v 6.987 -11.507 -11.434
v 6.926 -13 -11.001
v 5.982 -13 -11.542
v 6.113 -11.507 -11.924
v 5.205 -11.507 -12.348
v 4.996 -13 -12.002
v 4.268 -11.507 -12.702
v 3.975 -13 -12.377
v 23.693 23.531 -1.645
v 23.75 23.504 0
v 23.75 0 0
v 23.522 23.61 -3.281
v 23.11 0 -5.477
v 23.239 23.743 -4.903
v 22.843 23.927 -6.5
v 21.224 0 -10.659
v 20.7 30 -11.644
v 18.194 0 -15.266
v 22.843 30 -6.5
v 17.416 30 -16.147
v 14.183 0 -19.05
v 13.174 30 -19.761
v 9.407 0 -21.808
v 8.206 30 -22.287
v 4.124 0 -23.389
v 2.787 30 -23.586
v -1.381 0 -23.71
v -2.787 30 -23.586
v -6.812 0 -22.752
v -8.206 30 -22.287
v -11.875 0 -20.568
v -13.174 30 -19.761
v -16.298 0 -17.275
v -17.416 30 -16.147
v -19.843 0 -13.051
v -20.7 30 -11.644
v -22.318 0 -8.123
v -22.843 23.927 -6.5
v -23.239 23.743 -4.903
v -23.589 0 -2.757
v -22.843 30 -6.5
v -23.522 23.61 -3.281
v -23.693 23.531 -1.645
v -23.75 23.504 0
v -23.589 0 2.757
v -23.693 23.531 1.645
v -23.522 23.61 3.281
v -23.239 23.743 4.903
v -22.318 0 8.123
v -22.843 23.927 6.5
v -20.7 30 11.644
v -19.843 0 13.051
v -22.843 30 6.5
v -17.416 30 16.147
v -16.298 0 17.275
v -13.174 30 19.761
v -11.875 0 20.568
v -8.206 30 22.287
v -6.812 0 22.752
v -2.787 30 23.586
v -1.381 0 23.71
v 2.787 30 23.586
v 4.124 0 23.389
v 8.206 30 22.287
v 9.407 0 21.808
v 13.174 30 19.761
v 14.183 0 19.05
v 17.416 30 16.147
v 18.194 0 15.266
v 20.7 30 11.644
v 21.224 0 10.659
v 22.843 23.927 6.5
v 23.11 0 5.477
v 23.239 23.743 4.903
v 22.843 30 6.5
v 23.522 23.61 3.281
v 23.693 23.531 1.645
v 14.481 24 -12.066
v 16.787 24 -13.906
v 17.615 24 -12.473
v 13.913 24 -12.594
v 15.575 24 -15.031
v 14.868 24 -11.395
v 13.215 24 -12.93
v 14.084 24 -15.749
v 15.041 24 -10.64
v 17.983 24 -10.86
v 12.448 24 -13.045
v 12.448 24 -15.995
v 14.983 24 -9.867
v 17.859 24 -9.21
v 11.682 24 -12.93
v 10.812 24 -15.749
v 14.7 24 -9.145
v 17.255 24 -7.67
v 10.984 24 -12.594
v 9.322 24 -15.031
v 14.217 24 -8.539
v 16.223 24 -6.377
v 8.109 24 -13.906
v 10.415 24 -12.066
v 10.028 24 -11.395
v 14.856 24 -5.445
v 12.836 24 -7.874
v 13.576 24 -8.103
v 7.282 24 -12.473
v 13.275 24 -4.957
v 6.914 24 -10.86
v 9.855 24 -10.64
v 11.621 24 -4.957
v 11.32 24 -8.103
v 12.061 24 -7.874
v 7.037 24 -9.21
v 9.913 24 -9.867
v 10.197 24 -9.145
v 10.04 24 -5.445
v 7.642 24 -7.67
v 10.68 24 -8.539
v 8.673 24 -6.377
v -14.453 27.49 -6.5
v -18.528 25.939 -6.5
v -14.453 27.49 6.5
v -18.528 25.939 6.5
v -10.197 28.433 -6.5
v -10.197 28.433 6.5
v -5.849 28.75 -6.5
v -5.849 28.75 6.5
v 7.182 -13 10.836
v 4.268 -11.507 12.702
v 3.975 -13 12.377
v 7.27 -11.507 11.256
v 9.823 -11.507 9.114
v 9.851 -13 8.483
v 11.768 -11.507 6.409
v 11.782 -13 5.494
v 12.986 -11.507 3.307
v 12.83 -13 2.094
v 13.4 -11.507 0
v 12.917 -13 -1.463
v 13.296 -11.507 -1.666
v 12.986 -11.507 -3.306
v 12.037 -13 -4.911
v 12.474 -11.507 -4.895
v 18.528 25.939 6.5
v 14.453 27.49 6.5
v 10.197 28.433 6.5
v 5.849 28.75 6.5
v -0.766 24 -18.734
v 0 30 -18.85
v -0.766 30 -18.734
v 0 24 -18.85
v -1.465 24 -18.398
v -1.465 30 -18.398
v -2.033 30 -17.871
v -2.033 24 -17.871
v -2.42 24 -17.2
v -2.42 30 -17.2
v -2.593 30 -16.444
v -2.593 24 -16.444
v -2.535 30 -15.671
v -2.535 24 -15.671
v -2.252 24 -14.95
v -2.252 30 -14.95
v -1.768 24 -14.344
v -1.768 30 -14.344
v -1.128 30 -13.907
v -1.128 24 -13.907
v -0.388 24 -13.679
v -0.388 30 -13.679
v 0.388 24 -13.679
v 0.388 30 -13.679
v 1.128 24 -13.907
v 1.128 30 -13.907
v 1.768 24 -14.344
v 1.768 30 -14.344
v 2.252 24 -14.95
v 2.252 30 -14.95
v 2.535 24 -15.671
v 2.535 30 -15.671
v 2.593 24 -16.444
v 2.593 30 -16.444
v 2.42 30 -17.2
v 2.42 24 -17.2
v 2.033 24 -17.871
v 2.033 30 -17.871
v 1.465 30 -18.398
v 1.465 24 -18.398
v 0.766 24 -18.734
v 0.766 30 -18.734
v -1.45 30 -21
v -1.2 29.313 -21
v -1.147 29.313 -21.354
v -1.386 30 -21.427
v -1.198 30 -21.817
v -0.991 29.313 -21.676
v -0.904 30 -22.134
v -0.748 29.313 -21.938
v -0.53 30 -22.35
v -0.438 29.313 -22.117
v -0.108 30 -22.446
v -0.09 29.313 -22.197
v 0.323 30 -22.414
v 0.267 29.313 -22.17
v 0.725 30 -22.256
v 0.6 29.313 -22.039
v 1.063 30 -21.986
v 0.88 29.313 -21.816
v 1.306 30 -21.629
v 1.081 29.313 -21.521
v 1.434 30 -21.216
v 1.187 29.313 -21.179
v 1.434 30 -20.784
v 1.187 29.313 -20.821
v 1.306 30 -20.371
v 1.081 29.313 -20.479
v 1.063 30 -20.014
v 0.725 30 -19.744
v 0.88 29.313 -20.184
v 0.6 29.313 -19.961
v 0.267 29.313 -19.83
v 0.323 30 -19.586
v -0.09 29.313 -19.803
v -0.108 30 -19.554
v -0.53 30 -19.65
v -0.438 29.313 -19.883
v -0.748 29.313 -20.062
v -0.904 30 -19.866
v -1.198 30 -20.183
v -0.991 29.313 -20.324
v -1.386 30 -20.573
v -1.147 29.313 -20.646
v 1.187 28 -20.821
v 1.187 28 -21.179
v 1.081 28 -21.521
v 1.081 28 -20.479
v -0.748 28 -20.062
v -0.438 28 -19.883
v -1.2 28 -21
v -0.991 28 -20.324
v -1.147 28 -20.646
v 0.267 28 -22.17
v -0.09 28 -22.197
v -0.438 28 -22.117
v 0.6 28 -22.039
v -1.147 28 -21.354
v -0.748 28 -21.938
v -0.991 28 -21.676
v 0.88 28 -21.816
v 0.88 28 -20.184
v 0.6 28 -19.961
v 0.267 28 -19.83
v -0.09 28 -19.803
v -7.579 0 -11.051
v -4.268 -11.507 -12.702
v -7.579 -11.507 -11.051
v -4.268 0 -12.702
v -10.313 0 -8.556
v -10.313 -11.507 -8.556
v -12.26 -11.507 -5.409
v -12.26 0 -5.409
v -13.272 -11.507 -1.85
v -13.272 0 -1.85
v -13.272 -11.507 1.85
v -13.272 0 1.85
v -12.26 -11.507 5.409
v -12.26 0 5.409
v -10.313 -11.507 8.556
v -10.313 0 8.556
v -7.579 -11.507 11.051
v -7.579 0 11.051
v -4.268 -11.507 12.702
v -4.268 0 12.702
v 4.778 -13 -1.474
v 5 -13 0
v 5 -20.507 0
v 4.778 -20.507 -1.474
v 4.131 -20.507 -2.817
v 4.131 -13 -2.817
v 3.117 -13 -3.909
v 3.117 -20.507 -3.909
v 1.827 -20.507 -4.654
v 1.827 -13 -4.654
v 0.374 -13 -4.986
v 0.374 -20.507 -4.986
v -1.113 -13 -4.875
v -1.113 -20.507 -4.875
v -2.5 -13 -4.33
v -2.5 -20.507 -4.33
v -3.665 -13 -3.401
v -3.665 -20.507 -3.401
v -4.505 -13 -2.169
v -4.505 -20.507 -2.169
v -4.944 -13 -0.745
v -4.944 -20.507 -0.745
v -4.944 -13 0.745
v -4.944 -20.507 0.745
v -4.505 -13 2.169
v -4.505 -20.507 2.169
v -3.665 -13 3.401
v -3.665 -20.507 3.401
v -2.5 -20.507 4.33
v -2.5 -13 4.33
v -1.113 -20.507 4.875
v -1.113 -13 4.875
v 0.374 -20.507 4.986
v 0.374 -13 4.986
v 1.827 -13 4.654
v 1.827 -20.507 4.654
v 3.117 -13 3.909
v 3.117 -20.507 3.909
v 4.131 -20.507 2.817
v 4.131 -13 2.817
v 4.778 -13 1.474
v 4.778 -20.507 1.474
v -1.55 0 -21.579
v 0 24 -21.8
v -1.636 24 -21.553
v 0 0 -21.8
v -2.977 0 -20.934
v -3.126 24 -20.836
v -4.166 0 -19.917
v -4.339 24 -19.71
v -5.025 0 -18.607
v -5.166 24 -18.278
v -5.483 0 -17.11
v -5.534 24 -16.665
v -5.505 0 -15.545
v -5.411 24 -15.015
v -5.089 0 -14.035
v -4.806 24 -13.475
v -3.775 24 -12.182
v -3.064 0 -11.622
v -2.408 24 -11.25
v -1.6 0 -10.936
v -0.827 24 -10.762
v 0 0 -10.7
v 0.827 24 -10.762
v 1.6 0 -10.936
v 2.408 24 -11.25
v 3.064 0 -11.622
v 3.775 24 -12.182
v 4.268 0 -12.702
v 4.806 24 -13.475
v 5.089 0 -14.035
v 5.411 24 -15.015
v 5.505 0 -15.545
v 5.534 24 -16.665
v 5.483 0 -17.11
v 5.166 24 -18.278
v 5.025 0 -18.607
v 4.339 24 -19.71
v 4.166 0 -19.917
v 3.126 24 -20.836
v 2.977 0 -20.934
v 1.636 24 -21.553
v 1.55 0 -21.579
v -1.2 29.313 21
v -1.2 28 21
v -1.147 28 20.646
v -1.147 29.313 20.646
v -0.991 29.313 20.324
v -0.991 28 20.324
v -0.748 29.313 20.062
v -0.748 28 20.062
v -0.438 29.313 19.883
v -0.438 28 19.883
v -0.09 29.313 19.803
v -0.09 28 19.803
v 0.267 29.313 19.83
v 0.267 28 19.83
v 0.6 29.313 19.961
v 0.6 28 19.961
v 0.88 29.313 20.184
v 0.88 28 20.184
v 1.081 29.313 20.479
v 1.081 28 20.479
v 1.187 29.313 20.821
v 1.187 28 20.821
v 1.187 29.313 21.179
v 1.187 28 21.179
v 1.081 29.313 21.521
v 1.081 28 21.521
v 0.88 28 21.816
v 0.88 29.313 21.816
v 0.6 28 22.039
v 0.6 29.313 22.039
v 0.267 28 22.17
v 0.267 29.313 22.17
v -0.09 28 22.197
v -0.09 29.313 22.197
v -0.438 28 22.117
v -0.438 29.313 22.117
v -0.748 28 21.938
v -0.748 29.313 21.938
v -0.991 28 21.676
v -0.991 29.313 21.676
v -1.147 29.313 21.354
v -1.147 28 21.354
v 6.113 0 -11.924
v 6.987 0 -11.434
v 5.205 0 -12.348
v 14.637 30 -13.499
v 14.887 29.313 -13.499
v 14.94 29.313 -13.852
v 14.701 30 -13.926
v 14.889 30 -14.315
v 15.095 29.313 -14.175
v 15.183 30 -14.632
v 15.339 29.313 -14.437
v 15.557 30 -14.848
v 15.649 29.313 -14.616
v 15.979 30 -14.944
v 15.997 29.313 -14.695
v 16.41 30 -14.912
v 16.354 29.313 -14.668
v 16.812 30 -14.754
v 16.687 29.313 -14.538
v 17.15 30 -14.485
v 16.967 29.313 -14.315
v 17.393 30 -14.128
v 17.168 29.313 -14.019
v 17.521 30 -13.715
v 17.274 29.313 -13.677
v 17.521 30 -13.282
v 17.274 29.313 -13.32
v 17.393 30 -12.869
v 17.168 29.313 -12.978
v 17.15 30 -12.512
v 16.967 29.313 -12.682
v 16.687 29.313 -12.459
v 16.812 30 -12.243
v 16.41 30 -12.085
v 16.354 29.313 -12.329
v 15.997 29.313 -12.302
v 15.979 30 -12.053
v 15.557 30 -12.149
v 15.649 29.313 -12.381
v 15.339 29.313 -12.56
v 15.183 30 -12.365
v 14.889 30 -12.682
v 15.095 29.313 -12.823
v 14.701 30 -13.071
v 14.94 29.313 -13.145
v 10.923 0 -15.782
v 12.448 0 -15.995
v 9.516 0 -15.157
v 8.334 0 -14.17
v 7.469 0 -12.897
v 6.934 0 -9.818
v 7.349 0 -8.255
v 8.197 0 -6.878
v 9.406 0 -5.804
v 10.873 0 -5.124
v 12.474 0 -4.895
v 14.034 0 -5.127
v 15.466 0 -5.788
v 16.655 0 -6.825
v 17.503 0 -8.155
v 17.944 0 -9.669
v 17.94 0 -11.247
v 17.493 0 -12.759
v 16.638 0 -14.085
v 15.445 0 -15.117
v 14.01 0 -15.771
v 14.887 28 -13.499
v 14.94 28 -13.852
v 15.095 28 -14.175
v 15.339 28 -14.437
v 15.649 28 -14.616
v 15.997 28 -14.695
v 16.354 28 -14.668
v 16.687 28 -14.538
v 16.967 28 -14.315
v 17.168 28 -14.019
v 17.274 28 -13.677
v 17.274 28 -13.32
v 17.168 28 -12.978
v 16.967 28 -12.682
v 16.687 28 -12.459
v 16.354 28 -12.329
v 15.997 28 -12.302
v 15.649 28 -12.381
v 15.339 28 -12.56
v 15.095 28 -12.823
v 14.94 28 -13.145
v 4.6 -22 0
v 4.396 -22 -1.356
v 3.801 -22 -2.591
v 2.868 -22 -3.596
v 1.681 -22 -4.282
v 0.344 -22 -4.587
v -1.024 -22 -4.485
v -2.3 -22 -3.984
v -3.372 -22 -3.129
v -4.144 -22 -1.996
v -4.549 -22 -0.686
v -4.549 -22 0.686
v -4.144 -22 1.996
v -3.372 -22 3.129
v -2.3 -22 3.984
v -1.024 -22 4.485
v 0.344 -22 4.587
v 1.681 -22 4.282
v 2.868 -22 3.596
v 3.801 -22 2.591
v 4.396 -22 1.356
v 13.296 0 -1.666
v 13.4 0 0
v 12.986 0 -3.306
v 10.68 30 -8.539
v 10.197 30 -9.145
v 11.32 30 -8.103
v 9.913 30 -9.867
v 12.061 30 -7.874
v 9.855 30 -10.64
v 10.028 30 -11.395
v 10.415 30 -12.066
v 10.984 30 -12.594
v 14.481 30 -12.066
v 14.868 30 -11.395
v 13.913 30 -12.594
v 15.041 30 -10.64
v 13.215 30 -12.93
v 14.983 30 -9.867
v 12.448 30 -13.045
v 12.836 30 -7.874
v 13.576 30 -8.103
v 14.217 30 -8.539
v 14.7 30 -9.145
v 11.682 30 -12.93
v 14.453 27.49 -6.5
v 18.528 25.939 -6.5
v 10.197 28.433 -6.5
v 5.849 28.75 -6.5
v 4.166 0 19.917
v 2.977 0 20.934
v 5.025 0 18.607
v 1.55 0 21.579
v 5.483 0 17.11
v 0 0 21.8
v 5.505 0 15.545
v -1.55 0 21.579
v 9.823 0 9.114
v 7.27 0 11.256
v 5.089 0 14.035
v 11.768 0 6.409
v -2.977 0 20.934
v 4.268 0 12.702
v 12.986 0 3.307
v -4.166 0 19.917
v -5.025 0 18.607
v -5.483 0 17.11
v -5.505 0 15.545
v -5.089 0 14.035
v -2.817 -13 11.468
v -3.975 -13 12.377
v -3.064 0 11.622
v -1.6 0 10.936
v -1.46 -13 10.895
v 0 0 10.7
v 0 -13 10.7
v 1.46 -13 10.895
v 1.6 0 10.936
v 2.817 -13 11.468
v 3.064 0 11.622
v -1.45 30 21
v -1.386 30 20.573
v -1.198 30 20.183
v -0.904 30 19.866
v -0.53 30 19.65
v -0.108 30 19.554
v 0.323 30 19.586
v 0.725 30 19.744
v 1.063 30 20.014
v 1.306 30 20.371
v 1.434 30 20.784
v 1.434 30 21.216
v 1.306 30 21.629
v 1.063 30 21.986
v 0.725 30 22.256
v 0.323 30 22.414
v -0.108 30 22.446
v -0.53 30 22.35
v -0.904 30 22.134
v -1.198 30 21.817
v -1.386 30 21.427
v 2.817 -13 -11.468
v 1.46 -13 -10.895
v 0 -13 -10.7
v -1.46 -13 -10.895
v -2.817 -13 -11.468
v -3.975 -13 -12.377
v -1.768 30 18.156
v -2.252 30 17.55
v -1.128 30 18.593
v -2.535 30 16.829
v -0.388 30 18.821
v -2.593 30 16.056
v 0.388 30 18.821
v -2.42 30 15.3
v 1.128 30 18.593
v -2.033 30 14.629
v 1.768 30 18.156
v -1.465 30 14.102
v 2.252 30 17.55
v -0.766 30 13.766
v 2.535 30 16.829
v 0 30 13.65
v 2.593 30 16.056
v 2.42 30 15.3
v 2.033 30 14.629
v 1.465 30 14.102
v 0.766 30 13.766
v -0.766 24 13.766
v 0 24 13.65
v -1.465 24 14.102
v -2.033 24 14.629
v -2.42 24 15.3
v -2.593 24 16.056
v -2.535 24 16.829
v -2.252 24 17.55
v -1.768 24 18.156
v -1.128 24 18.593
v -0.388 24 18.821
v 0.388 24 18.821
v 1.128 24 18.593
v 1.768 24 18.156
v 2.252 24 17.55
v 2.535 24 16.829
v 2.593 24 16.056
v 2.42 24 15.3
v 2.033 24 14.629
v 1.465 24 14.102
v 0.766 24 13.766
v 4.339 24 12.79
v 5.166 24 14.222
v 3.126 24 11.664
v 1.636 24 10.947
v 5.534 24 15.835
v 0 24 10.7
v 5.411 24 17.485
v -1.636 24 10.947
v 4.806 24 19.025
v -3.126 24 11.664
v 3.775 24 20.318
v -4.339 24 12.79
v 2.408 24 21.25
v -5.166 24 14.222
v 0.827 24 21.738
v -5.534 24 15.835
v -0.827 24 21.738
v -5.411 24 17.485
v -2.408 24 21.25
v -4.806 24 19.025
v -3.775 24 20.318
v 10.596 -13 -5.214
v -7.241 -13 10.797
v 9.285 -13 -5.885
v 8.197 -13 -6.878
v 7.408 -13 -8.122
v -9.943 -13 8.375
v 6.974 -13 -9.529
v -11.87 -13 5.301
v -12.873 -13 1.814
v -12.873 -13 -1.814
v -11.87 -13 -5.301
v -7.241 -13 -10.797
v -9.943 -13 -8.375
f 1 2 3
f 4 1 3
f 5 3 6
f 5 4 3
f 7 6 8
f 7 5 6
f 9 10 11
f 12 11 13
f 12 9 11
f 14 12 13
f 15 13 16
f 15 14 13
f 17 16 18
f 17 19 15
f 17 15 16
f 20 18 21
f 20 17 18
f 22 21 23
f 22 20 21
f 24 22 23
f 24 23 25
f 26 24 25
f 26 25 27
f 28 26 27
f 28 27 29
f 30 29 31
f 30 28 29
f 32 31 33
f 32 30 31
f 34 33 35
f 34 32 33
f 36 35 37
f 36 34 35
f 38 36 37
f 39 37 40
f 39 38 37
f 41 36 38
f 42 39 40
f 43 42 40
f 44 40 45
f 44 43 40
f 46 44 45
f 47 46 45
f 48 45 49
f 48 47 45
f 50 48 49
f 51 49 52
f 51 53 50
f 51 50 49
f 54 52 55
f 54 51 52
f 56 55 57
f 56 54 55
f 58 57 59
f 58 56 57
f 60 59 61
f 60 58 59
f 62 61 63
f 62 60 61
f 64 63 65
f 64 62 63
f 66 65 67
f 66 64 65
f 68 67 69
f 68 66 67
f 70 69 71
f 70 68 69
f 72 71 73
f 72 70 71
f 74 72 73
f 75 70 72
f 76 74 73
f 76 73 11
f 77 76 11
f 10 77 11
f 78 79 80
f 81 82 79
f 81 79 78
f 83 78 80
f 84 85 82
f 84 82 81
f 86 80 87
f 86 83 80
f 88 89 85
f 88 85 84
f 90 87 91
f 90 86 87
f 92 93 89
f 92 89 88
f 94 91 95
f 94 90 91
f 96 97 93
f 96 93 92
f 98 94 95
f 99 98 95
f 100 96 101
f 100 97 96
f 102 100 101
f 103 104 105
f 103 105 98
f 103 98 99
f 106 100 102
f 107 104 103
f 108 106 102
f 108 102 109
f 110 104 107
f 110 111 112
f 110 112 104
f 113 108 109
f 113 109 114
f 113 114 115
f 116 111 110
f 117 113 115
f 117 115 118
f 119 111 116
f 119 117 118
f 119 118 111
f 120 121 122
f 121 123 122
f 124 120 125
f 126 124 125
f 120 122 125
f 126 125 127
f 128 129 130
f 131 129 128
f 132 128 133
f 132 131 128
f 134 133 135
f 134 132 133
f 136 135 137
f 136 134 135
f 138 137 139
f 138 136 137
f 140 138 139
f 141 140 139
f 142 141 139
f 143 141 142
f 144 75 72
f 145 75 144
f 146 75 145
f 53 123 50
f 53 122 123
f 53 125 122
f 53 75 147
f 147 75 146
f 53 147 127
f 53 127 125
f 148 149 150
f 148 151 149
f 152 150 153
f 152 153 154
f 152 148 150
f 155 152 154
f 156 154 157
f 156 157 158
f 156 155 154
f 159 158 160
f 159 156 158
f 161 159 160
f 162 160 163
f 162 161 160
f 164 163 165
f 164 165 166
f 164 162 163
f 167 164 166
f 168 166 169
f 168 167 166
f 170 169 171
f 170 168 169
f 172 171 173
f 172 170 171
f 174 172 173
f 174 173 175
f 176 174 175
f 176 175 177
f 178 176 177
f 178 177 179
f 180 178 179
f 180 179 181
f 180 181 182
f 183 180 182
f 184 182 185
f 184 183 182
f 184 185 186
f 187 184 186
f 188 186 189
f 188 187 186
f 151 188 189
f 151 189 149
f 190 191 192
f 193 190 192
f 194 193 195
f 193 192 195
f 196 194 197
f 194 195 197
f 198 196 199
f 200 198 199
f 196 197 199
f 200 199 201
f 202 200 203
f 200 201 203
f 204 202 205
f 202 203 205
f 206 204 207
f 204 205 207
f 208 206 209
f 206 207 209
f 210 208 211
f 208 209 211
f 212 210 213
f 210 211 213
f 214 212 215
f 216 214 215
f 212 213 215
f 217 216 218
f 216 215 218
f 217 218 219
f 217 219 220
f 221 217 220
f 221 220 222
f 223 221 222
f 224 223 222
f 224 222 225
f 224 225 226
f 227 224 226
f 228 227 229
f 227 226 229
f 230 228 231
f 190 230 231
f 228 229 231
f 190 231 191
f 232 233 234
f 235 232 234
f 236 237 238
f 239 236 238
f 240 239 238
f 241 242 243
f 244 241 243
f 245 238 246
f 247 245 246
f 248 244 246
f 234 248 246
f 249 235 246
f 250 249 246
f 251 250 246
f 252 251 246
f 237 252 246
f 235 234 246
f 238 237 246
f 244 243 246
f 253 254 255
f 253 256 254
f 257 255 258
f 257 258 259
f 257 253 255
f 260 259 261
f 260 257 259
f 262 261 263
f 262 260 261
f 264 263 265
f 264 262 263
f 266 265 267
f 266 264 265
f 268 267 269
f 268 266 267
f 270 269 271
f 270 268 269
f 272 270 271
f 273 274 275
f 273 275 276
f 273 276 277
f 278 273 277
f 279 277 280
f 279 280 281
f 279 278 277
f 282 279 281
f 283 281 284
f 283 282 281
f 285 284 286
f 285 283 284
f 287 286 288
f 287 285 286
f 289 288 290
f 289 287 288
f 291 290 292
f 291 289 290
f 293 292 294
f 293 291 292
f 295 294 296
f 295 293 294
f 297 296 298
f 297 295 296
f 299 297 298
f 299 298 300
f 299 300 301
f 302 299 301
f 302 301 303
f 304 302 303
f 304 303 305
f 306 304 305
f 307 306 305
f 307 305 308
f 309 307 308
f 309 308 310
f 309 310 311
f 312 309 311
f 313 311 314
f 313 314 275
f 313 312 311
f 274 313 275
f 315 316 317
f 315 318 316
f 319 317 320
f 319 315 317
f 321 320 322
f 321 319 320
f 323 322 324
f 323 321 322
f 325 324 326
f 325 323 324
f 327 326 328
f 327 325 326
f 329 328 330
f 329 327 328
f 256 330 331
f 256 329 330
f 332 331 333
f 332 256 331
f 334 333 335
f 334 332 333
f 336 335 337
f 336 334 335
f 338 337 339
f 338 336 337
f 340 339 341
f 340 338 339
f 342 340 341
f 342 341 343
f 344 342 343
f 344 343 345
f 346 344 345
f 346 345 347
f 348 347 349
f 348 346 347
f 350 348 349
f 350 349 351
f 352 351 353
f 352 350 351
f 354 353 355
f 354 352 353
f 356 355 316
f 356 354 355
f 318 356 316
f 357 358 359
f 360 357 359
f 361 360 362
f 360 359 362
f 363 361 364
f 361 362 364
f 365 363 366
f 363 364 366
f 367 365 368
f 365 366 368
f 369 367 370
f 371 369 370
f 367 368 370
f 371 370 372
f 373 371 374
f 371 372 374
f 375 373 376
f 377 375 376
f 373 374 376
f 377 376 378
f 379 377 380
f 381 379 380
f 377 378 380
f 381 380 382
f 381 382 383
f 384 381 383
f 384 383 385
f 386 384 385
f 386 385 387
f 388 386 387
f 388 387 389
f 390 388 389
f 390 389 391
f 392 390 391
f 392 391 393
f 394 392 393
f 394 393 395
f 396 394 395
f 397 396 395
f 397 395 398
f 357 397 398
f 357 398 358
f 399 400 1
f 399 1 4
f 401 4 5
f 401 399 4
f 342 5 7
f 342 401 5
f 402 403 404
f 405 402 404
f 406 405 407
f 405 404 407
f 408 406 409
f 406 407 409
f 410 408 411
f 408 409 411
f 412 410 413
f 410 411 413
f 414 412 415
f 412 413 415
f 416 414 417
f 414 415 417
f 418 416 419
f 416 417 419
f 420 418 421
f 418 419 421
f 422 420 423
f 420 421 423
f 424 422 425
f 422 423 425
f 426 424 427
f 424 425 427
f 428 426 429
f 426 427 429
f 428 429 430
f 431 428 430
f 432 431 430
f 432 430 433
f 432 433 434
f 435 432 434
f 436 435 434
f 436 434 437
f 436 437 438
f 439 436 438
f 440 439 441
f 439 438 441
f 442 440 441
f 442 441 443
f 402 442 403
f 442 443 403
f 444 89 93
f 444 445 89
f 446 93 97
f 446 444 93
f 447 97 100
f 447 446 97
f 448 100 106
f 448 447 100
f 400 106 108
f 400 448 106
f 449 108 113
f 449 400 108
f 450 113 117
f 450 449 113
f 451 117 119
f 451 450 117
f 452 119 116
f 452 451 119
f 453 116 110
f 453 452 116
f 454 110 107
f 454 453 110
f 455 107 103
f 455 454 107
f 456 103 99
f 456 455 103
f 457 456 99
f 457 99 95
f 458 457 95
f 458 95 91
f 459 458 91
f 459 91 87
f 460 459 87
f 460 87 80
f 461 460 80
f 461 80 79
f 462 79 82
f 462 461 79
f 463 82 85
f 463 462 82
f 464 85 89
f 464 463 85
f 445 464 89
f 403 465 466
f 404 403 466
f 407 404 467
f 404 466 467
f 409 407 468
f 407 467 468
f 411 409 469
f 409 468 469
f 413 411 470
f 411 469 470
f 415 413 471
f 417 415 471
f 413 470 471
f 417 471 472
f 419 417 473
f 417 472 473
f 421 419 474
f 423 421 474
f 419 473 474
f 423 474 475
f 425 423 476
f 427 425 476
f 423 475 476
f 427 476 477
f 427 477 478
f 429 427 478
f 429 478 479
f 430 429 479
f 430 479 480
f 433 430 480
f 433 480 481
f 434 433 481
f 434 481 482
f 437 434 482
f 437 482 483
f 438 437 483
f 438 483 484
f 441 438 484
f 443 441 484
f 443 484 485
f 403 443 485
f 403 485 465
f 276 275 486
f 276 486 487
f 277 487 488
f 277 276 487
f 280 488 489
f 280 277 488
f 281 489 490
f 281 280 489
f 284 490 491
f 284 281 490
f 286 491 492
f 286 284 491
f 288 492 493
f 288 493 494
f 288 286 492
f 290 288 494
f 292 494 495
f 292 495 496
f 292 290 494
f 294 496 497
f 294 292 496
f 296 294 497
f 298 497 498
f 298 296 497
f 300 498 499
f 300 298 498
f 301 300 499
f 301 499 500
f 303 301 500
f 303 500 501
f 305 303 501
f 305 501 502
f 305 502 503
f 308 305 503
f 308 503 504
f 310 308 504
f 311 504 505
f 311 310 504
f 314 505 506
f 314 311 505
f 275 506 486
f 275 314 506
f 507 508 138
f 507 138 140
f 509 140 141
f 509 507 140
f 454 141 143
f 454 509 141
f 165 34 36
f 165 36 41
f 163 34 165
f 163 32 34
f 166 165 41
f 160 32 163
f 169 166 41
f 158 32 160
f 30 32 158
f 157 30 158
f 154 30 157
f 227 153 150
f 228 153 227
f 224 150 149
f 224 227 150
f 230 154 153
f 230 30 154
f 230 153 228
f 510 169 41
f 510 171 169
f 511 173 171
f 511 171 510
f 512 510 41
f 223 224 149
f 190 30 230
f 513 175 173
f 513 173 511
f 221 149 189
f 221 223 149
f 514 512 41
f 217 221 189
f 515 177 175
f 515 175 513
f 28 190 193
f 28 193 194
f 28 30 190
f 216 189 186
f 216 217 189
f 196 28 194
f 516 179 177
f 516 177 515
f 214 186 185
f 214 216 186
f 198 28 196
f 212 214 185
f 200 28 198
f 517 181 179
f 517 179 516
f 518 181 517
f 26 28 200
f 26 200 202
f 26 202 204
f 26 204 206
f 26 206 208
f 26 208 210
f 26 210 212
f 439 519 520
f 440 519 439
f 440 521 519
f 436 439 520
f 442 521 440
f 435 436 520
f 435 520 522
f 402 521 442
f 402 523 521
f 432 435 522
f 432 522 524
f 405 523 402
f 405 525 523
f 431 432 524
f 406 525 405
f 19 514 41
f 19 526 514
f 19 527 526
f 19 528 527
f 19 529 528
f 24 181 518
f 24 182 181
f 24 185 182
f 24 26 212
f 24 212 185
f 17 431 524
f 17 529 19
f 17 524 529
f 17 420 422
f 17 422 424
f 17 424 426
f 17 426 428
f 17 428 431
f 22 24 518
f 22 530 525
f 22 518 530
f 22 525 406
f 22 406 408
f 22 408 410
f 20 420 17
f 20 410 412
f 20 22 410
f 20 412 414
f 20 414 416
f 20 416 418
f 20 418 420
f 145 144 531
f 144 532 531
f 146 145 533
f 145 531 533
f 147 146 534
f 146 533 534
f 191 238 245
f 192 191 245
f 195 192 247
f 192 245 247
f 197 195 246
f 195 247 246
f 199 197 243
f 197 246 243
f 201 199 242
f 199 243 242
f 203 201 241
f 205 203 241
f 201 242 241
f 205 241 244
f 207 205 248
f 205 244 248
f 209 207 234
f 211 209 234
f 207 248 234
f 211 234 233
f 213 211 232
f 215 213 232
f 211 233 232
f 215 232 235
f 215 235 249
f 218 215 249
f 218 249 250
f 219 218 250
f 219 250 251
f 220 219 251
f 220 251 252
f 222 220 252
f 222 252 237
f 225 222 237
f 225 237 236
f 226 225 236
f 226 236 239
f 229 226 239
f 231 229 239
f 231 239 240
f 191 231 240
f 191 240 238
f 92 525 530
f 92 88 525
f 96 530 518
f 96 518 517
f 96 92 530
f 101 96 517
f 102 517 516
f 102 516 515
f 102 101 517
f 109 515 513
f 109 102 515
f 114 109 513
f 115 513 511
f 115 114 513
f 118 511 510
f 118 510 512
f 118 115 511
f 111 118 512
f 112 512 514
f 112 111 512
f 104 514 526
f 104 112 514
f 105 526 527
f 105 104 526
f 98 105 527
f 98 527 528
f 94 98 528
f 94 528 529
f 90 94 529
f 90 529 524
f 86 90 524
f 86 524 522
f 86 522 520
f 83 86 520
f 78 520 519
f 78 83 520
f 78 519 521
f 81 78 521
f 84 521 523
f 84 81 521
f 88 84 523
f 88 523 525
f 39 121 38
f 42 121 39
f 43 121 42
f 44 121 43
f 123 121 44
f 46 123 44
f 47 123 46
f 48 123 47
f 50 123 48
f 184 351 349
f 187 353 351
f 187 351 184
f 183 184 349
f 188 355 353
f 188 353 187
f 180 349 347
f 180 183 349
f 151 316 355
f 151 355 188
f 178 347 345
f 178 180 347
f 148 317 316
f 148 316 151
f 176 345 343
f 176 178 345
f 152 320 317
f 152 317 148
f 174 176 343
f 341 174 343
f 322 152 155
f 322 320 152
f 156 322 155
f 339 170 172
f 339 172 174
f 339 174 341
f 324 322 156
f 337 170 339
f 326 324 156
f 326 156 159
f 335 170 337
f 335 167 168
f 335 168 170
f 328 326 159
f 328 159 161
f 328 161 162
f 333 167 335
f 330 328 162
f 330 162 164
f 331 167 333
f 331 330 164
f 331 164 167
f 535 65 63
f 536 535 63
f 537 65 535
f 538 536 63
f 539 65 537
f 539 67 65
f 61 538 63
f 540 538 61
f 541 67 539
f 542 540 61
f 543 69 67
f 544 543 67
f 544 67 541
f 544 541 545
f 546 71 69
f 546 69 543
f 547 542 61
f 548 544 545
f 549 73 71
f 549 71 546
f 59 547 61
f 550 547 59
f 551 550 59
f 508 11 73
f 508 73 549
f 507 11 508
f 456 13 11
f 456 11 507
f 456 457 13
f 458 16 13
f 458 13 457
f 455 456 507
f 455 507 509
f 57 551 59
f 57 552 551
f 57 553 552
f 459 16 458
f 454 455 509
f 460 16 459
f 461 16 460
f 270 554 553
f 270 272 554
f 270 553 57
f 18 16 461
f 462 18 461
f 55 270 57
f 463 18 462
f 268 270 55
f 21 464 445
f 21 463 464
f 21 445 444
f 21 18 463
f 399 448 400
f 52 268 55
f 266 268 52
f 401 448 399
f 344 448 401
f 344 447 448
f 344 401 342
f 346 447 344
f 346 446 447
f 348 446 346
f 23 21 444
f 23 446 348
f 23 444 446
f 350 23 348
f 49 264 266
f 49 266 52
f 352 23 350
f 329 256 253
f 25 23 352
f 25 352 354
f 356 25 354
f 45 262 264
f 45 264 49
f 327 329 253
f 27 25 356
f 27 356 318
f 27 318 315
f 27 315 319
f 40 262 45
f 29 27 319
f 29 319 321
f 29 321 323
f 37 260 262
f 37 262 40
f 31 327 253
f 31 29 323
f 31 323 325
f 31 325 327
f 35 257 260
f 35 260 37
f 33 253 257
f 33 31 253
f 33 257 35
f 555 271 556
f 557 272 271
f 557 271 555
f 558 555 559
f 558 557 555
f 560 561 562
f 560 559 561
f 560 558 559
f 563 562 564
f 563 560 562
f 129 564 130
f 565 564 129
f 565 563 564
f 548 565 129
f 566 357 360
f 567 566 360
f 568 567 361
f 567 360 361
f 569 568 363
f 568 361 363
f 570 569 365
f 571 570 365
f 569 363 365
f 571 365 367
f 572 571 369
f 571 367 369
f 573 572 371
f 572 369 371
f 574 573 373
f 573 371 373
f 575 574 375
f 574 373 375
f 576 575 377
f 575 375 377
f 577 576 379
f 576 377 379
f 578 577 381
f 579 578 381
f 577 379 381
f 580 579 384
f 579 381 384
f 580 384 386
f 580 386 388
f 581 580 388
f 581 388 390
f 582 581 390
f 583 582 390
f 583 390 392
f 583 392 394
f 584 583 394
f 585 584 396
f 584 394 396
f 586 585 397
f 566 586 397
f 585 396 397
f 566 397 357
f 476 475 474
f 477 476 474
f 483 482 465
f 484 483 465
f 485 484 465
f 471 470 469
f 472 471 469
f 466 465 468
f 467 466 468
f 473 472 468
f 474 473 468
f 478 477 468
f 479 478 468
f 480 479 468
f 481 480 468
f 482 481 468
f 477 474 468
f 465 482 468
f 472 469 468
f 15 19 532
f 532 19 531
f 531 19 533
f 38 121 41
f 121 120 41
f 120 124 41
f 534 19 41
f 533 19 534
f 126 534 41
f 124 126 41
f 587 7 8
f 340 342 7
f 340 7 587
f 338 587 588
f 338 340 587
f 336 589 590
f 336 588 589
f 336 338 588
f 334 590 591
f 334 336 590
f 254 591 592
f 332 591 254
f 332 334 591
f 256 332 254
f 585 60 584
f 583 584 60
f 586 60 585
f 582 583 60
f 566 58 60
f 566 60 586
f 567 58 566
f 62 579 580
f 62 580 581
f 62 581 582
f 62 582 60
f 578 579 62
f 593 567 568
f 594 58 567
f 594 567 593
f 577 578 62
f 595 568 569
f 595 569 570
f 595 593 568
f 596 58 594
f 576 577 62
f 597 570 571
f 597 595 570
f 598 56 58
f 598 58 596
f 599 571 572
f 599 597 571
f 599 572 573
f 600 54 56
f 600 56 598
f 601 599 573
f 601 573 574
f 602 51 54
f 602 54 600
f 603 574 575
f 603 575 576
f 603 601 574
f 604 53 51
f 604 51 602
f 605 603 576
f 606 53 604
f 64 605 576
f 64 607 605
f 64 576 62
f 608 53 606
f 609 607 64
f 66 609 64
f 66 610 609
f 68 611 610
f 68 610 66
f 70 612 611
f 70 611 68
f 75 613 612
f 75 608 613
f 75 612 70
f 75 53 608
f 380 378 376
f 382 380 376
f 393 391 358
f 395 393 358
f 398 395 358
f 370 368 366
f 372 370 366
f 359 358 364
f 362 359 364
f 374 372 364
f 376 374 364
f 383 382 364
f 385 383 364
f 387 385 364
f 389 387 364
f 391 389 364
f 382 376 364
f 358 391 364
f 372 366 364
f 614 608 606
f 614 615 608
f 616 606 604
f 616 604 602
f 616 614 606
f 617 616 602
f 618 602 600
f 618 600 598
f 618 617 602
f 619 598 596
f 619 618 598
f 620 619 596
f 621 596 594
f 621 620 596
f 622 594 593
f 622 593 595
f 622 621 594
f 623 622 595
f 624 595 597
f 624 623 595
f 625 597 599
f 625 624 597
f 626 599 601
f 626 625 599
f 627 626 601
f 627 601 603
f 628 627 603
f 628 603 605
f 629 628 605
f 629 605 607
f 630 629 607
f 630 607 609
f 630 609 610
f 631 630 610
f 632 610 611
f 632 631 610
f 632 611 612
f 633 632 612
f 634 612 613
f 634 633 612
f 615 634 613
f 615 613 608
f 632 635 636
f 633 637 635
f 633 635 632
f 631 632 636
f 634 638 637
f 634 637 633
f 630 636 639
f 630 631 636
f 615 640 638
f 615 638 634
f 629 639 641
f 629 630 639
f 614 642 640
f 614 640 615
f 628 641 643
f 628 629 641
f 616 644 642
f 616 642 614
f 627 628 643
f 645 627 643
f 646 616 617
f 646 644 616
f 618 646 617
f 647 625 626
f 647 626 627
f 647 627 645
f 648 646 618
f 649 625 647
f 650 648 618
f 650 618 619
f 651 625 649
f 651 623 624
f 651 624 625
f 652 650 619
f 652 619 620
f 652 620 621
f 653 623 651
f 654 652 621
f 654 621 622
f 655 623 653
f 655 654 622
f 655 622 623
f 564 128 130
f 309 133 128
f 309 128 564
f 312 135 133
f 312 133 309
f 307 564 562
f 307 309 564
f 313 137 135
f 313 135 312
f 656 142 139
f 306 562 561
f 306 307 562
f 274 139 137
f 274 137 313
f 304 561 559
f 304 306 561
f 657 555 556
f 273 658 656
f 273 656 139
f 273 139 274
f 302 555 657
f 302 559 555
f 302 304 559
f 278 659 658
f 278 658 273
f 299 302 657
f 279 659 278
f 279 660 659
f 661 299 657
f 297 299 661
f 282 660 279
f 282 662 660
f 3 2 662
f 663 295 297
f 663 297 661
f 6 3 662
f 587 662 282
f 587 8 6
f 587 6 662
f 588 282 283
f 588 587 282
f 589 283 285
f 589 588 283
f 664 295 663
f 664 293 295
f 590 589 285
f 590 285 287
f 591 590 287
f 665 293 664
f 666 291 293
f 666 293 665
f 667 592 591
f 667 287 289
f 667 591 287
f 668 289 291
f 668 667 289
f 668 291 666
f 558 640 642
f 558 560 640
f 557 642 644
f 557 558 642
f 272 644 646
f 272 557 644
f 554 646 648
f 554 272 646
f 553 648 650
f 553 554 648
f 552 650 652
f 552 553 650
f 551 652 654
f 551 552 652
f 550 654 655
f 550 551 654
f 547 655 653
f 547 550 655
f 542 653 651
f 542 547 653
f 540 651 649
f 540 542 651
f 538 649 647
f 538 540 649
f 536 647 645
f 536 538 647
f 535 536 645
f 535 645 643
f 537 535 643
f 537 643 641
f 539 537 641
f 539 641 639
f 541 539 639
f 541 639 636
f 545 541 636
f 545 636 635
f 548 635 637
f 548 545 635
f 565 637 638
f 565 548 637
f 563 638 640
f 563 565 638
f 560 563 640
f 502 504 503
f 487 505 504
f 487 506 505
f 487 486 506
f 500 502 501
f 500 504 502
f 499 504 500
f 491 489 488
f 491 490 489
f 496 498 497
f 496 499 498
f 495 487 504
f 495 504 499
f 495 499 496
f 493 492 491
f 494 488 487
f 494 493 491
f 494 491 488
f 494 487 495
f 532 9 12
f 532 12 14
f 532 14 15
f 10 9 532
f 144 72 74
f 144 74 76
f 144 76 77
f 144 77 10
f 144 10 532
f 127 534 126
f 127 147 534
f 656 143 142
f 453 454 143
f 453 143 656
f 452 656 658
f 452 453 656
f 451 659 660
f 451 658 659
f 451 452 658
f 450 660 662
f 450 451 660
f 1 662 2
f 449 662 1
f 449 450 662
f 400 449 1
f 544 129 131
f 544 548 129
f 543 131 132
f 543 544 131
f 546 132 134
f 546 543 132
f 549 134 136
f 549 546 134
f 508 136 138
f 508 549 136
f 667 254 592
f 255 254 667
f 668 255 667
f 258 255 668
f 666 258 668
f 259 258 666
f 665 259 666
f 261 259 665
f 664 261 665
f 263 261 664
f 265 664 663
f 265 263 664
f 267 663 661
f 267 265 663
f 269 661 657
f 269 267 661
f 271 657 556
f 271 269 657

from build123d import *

# Parameters (mm, degrees)
CHAMFER2_SIZE                  = 0.4
CHAMFER2_SIZE2                 = 1.492820323
CHAMFER2_PART_2_SIZE           = 0.4
CHAMFER2_PART_2_SIZE2          = 1.492820323
CBORE_FOR_M5_SBHCS1_AT_2_COUNT = 2
CBORE_FOR_M5_SBHCS1_AT_2_PITCH = 32.5
CBORE_FOR_M5_SBHCS1_AT_3_COUNT = 2
CBORE_FOR_M5_SBHCS1_AT_3_PITCH = 29.455003079
SKETCH16_R                     = 5.55
CUT_EXTRUDE6_DEPTH             = 23
F_2_4_2_4_DIAMETER_HOLE1_D     = 2.4
F_2_4_2_4_DIAMETER_HOLE1_DEPTH = 2
CHAMFER1_SIZE                  = 0.25
CHAMFER1_SIZE2                 = 0.686869355
CUT_EXTRUDE8_DEPTH             = 6.5
FILLET1_R                      = 30


with BuildPart() as part:
    # Sketch1 → Revolve1 (revolve)
    with BuildSketch(Plane.XY):
        Polygon((5, -22), (5, -13), (13.4, -13), (13.4, 0), (23.75, 0), (23.75, 30), (0, 30), (0, -22), align=None)
    revolve(axis=Axis((0, 0, 0), (0, 1, 0)))

    # Chamfer2
    chamfer2_edges = [part.edges().sort_by_distance(p)[0] for p in [
        (-5, -22, 0),
    ]]
    chamfer2_side = [part.faces().sort_by_distance(p)[0] for p in [
        (0, -22, 0),
    ]]
    chamfer(chamfer2_edges, length=CHAMFER2_SIZE, length2=CHAMFER2_SIZE2, reference=chamfer2_side[0])

    # Chamfer2 part 2
    chamfer2_part_2_edges = [part.edges().sort_by_distance(p)[0] for p in [
        (-13.4, -13, 0),
    ]]
    chamfer2_part_2_side = [part.faces().sort_by_distance(p)[0] for p in [
        (-5.379009235, -13, 0),
    ]]
    chamfer(chamfer2_part_2_edges, length=CHAMFER2_PART_2_SIZE, length2=CHAMFER2_PART_2_SIZE2, reference=chamfer2_part_2_side[0])

    # Sketch15 → CBORE for M5 SBHCS1 (revolve, cut)
    with BuildSketch(Plane(origin=(0, 0, 16.25), x_dir=(0, 0, -1), z_dir=(1, 0, 0))):
        Polygon((0, 0), (0, 30), (2.6, 30), (2.6, 24), (5.55, 24), (5.55, 0), align=None)
    cbore_for_m5_sbhcs1 = revolve(axis=Axis((0, -6.35, 16.25), (0, 1, 0)), mode=Mode.SUBTRACT)

    # CBORE for M5 SBHCS1 at 2: CBORE for M5 SBHCS1 ×2
    with Locations(*[(0, 0, -i * CBORE_FOR_M5_SBHCS1_AT_2_PITCH) for i in range(1, CBORE_FOR_M5_SBHCS1_AT_2_COUNT)]):
        add(cbore_for_m5_sbhcs1, mode=Mode.SUBTRACT)

    # CBORE for M5 SBHCS1 at 3: CBORE for M5 SBHCS1 ×2
    with Locations(*[Vector(0.422618262, 0, -0.906307787) * (i * CBORE_FOR_M5_SBHCS1_AT_3_PITCH) for i in range(1, CBORE_FOR_M5_SBHCS1_AT_3_COUNT)]):
        add(cbore_for_m5_sbhcs1, mode=Mode.SUBTRACT)

    # Sketch16 → Cut-Extrude6 (cut, through all)
    with BuildSketch(Plane.XZ):
        with Locations((0, -16.25)):
            Circle(SKETCH16_R)
        with Locations((12.448222201, -10.445298657)):
            Circle(SKETCH16_R)
        with Locations((0, 16.25)):
            Circle(SKETCH16_R)
    extrude(amount=CUT_EXTRUDE6_DEPTH, mode=Mode.SUBTRACT)

    # Ø2.4 (2.4) Diameter Hole1
    with Locations(Plane(origin=(0, 30, 0), x_dir=(1, 0, 0), z_dir=(0, 1, 0))):
        with Locations((0, 21), (16.086933305, 13.498539803), (0, -21)):
            Hole(F_2_4_2_4_DIAMETER_HOLE1_D / 2, depth=F_2_4_2_4_DIAMETER_HOLE1_DEPTH)

    # Chamfer1
    chamfer1_edges = [part.edges().sort_by_distance(p)[0] for p in [
        (1.2, 30, 21),
        (17.286933305, 30, -13.498539803),
        (1.2, 30, -21),
    ]]
    chamfer1_side = [part.faces().sort_by_distance(p)[0] for p in [
        (-0.198929798, 30, 0.16692192),
    ]]
    chamfer(chamfer1_edges, length=CHAMFER1_SIZE, length2=CHAMFER1_SIZE2, reference=chamfer1_side[0])

    # Sketch30 → Cut-Extrude8 (cut, symmetric)
    with BuildSketch(Plane.XY):
        Polygon((-23.75, 30), (23.75, 30), (23.75, 23.504038846), (12.5, 28.75), (-12.5, 28.75), (-23.75, 23.504038846), align=None)
    extrude(amount=CUT_EXTRUDE8_DEPTH, both=True, mode=Mode.SUBTRACT)

    # Fillet1
    fillet1_edges = [part.edges().sort_by_distance(p)[0] for p in [
        (12.5, 28.75, 0),
        (-12.5, 28.75, 0),
    ]]
    fillet(fillet1_edges, radius=FILLET1_R)


solid = part.part
